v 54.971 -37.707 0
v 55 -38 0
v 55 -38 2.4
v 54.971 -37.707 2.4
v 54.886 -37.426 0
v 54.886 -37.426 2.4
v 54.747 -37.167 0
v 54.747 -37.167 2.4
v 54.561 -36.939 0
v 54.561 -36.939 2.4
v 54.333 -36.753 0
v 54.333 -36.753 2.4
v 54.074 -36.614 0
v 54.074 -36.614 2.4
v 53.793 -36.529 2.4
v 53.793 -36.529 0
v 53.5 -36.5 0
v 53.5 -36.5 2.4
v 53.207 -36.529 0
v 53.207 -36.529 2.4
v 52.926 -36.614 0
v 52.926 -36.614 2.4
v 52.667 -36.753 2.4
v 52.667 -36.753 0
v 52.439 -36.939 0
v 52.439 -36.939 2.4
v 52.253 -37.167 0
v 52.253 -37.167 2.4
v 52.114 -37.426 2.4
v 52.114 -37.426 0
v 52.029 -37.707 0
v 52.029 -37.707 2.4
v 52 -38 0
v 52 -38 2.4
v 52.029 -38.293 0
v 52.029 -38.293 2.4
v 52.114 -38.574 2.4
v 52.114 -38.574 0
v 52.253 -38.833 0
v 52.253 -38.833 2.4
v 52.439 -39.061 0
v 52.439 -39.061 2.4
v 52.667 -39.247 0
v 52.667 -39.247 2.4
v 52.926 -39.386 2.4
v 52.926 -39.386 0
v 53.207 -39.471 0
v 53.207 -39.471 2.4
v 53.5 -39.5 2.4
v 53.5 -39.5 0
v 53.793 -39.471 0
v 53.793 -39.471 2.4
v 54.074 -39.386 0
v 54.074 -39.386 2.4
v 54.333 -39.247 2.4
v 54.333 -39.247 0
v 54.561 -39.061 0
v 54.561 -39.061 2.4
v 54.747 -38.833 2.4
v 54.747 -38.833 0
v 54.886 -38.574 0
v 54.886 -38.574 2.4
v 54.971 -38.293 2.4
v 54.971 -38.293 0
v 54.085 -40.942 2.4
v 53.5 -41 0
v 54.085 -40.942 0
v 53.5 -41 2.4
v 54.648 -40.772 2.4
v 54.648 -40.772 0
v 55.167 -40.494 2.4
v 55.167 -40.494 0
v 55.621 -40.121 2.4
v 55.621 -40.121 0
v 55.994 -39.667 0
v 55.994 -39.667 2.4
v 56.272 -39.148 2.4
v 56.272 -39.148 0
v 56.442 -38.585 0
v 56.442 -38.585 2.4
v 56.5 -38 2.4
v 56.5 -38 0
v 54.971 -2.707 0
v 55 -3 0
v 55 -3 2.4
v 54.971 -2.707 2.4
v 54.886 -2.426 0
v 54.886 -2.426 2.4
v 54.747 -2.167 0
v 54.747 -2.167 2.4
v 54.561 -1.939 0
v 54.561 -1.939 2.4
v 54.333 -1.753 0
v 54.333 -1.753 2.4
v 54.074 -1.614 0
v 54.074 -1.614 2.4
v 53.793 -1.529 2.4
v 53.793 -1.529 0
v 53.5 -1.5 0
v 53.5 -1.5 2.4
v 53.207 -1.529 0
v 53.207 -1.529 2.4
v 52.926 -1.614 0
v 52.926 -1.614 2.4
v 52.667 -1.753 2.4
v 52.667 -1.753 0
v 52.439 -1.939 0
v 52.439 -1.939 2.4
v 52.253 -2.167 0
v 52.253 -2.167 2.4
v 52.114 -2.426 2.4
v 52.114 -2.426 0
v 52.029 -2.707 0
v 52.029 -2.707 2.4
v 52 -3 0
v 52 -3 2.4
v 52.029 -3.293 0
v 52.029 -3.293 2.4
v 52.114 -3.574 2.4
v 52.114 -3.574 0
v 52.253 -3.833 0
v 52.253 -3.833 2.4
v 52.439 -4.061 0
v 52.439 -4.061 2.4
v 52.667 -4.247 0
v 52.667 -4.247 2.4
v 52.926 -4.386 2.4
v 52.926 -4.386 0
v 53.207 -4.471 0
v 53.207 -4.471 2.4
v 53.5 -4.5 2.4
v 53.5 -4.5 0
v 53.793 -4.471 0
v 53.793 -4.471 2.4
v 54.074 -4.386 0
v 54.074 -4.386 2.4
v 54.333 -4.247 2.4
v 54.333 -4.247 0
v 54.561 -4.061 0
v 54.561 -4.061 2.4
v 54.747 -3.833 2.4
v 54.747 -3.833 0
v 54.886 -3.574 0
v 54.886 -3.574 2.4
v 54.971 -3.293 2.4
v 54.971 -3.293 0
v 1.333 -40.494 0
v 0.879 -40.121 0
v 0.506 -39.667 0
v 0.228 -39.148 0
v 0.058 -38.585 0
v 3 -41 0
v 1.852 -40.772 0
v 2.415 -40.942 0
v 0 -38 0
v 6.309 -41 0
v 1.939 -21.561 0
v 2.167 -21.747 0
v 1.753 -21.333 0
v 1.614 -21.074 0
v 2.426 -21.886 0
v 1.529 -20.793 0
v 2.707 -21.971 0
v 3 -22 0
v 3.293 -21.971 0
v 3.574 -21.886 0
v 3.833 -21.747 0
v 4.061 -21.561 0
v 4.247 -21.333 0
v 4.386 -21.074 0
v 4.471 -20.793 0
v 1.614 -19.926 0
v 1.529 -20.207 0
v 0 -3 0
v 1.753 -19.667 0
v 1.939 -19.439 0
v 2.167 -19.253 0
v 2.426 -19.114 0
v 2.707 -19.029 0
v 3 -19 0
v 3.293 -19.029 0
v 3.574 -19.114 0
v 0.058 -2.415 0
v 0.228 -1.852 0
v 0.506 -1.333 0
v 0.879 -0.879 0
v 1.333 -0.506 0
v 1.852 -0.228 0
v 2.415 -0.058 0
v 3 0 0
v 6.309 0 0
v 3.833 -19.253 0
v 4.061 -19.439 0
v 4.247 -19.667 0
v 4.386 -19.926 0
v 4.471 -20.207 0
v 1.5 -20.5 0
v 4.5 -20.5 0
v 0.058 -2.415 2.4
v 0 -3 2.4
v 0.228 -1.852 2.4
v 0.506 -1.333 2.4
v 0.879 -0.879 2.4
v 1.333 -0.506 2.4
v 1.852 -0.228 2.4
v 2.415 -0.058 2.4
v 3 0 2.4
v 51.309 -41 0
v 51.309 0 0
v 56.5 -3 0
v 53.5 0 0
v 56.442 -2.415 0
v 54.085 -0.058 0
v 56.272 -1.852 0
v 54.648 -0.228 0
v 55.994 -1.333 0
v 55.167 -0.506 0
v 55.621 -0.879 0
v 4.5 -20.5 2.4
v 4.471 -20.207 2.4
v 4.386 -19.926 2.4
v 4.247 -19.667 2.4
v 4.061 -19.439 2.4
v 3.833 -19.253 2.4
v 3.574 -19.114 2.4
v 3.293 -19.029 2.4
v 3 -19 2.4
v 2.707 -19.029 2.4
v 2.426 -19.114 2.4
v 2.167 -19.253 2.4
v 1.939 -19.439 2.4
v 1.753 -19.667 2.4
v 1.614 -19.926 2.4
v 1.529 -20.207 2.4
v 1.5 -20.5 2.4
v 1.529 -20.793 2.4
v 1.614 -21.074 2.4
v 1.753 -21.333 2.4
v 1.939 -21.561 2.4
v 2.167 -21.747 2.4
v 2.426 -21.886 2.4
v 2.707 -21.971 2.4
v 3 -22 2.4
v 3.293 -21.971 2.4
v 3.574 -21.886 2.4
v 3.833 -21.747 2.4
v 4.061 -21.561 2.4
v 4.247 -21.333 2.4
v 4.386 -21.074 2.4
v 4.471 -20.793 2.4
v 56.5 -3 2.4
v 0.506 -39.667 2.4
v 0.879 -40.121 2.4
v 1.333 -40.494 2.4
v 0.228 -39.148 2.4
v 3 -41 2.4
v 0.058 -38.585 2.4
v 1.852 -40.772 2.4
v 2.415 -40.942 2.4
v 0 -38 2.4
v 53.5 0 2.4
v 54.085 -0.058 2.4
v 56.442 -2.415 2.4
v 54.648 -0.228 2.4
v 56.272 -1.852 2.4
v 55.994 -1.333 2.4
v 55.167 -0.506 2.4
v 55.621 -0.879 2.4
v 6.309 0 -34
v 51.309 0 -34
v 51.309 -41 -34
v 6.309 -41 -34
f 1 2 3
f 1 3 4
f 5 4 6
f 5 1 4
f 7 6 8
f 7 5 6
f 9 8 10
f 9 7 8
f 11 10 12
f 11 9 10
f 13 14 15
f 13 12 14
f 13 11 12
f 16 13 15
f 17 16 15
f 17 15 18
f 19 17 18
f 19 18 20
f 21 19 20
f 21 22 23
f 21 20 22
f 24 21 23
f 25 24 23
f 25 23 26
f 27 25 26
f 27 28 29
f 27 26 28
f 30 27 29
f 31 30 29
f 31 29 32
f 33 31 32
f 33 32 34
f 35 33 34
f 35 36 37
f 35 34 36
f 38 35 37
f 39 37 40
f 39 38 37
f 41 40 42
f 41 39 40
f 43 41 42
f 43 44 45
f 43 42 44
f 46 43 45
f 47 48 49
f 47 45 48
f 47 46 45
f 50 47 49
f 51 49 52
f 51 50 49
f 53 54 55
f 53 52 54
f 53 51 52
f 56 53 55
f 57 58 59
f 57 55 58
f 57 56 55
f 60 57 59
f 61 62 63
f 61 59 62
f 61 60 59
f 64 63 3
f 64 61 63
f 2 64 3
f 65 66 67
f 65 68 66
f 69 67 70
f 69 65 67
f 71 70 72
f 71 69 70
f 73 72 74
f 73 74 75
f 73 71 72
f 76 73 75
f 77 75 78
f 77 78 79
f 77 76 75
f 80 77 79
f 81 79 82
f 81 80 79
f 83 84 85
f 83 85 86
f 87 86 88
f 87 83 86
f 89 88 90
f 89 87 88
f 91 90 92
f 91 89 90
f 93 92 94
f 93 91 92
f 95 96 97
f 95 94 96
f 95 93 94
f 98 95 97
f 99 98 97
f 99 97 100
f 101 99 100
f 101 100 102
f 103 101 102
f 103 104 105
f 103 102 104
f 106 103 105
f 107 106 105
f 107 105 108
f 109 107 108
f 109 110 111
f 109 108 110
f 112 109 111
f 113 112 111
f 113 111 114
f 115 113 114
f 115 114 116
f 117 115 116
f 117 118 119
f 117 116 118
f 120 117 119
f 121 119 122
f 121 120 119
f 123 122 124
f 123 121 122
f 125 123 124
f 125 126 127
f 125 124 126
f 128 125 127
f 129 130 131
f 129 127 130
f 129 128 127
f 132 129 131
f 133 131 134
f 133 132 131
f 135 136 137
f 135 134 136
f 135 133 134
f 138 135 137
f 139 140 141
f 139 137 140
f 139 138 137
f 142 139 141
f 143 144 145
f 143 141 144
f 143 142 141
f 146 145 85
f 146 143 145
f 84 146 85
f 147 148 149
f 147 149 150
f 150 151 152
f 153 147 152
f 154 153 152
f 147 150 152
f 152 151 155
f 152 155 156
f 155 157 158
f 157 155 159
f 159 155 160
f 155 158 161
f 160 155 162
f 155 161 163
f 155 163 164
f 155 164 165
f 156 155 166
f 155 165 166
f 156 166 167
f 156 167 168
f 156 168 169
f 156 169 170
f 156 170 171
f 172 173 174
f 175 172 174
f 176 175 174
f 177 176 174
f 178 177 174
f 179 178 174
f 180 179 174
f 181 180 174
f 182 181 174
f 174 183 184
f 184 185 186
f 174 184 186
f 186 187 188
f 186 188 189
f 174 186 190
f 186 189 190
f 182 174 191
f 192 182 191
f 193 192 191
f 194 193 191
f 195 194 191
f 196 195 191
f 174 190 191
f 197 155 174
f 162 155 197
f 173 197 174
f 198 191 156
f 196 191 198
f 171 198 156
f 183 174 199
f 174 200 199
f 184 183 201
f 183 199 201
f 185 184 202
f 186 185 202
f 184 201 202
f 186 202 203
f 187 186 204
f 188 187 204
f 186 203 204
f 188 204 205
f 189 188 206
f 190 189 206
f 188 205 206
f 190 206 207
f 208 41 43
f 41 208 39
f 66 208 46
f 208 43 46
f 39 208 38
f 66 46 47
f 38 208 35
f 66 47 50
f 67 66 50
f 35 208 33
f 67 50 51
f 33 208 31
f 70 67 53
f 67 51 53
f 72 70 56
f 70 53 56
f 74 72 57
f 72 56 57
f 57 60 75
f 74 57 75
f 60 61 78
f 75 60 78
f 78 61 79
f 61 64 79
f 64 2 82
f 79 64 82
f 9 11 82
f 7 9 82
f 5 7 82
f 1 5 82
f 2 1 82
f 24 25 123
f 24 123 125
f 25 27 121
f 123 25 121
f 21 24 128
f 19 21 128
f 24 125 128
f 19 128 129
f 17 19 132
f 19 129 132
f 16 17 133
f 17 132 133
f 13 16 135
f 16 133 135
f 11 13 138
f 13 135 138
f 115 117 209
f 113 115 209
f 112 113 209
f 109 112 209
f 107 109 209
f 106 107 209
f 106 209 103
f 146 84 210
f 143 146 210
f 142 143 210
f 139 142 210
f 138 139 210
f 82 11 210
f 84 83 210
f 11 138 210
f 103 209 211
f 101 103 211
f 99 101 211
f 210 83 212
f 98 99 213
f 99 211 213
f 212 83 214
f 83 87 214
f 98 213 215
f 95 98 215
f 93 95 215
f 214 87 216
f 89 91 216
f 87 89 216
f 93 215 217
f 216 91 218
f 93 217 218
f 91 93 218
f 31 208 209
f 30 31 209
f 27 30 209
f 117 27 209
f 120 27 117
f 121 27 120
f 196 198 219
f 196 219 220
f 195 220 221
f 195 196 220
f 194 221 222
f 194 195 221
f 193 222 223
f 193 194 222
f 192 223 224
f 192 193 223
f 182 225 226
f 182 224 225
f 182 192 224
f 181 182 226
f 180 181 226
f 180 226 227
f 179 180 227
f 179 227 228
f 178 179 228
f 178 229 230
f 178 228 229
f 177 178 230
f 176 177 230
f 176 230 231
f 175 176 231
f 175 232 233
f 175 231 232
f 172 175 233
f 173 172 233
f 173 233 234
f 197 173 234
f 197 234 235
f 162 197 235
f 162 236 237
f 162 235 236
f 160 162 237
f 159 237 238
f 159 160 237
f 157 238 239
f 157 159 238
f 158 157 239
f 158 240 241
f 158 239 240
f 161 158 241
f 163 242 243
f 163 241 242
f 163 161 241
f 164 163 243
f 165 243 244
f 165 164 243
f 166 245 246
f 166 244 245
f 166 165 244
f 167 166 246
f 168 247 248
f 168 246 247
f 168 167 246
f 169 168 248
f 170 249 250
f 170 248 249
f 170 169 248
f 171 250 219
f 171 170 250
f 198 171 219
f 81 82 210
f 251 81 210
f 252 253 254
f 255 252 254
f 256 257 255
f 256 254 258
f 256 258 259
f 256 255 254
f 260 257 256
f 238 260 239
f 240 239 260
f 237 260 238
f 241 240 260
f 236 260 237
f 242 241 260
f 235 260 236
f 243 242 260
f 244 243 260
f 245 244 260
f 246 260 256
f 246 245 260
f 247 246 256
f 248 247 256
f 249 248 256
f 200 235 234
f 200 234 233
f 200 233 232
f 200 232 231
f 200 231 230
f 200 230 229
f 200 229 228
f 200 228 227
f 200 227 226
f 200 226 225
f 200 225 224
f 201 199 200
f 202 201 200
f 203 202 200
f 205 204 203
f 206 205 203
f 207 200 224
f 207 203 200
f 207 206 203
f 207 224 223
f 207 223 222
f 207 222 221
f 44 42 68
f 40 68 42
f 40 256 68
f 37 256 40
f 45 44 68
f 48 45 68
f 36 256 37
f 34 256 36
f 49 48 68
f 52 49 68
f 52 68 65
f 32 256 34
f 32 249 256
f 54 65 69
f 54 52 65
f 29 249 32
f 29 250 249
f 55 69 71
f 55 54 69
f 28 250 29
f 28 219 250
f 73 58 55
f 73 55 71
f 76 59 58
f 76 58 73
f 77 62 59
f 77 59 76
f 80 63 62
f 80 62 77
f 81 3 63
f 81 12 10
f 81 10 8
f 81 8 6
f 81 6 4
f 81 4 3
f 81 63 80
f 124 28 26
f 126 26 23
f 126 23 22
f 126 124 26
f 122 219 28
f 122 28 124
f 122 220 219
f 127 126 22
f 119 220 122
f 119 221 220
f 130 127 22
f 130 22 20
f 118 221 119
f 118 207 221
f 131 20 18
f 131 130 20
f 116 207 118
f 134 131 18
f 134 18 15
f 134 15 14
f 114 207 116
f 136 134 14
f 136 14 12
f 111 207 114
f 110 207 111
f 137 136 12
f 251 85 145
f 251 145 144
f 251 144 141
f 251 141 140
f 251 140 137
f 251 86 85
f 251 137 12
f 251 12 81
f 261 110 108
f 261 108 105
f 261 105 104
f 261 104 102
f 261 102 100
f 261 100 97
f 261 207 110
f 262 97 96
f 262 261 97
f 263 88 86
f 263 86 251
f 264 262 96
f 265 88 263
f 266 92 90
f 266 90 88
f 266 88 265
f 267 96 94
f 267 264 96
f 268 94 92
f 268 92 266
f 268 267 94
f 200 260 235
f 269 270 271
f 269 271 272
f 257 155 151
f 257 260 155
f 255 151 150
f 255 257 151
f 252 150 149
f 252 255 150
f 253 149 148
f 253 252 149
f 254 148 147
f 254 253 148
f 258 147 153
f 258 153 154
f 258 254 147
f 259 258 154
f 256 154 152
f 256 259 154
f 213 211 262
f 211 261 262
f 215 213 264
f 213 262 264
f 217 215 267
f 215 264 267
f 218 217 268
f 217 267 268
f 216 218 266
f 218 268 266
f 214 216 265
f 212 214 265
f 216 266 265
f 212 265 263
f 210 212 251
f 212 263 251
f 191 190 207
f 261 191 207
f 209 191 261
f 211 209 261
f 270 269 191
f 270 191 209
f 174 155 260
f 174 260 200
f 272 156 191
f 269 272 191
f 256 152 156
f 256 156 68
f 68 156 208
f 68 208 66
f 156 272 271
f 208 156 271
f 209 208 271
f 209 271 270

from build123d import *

# Parameters (mm, degrees)
SKETCH_1_W               = 56.5
SKETCH_1_H               = 41
EXTRUDE_1_DEPTH          = 2.4
CUT_EXTRUDE_1_DEPTH      = 70.849910522
CUT_EXTRUDE_1_DEPTH_BACK = 70.849910522
SKETCH_2_R               = 1.5
SKETCH_3_W               = 45
SKETCH_3_H               = 41
EXTRUDE_2_DEPTH          = 34
FILLET_1_R               = 3


with BuildPart() as part:
    # 草图1 → 凸台-拉伸1 (new body)
    with BuildSketch(Plane.XY):
        with Locations((28.25, -20.5)):
            Rectangle(SKETCH_1_W, SKETCH_1_H)
    extrude(amount=EXTRUDE_1_DEPTH)

    # 草图2 → 切除-拉伸1 (cut, two sides: drawn at the far end of the back side and taken through both)
    with BuildSketch(Plane.XY.offset(2.4).offset(-CUT_EXTRUDE_1_DEPTH_BACK)):
        with Locations((53.5, -3)):
            Circle(SKETCH_2_R)
        with Locations((53.5, -38)):
            Circle(SKETCH_2_R)
        with Locations((3, -20.5)):
            Circle(SKETCH_2_R)
    extrude(amount=CUT_EXTRUDE_1_DEPTH + CUT_EXTRUDE_1_DEPTH_BACK, mode=Mode.SUBTRACT)

    # 草图3 → 凸台-拉伸2 (add)
    with BuildSketch(Plane(origin=(0, 0, 0), x_dir=(-1, 0, 0), z_dir=(0, 0, -1))):
        with Locations((-28.809280121, -20.5)):
            Rectangle(SKETCH_3_W, SKETCH_3_H)
    extrude(amount=EXTRUDE_2_DEPTH)

    # 圆角1
    fillet_1_edges = [part.edges().sort_by_distance(p)[0] for p in [
        (0, 0, 1.2),
        (56.5, 0, 1.2),
        (56.5, -41, 1.2),
        (0, -41, 1.2),
    ]]
    fillet(fillet_1_edges, radius=FILLET_1_R)


solid = part.part
